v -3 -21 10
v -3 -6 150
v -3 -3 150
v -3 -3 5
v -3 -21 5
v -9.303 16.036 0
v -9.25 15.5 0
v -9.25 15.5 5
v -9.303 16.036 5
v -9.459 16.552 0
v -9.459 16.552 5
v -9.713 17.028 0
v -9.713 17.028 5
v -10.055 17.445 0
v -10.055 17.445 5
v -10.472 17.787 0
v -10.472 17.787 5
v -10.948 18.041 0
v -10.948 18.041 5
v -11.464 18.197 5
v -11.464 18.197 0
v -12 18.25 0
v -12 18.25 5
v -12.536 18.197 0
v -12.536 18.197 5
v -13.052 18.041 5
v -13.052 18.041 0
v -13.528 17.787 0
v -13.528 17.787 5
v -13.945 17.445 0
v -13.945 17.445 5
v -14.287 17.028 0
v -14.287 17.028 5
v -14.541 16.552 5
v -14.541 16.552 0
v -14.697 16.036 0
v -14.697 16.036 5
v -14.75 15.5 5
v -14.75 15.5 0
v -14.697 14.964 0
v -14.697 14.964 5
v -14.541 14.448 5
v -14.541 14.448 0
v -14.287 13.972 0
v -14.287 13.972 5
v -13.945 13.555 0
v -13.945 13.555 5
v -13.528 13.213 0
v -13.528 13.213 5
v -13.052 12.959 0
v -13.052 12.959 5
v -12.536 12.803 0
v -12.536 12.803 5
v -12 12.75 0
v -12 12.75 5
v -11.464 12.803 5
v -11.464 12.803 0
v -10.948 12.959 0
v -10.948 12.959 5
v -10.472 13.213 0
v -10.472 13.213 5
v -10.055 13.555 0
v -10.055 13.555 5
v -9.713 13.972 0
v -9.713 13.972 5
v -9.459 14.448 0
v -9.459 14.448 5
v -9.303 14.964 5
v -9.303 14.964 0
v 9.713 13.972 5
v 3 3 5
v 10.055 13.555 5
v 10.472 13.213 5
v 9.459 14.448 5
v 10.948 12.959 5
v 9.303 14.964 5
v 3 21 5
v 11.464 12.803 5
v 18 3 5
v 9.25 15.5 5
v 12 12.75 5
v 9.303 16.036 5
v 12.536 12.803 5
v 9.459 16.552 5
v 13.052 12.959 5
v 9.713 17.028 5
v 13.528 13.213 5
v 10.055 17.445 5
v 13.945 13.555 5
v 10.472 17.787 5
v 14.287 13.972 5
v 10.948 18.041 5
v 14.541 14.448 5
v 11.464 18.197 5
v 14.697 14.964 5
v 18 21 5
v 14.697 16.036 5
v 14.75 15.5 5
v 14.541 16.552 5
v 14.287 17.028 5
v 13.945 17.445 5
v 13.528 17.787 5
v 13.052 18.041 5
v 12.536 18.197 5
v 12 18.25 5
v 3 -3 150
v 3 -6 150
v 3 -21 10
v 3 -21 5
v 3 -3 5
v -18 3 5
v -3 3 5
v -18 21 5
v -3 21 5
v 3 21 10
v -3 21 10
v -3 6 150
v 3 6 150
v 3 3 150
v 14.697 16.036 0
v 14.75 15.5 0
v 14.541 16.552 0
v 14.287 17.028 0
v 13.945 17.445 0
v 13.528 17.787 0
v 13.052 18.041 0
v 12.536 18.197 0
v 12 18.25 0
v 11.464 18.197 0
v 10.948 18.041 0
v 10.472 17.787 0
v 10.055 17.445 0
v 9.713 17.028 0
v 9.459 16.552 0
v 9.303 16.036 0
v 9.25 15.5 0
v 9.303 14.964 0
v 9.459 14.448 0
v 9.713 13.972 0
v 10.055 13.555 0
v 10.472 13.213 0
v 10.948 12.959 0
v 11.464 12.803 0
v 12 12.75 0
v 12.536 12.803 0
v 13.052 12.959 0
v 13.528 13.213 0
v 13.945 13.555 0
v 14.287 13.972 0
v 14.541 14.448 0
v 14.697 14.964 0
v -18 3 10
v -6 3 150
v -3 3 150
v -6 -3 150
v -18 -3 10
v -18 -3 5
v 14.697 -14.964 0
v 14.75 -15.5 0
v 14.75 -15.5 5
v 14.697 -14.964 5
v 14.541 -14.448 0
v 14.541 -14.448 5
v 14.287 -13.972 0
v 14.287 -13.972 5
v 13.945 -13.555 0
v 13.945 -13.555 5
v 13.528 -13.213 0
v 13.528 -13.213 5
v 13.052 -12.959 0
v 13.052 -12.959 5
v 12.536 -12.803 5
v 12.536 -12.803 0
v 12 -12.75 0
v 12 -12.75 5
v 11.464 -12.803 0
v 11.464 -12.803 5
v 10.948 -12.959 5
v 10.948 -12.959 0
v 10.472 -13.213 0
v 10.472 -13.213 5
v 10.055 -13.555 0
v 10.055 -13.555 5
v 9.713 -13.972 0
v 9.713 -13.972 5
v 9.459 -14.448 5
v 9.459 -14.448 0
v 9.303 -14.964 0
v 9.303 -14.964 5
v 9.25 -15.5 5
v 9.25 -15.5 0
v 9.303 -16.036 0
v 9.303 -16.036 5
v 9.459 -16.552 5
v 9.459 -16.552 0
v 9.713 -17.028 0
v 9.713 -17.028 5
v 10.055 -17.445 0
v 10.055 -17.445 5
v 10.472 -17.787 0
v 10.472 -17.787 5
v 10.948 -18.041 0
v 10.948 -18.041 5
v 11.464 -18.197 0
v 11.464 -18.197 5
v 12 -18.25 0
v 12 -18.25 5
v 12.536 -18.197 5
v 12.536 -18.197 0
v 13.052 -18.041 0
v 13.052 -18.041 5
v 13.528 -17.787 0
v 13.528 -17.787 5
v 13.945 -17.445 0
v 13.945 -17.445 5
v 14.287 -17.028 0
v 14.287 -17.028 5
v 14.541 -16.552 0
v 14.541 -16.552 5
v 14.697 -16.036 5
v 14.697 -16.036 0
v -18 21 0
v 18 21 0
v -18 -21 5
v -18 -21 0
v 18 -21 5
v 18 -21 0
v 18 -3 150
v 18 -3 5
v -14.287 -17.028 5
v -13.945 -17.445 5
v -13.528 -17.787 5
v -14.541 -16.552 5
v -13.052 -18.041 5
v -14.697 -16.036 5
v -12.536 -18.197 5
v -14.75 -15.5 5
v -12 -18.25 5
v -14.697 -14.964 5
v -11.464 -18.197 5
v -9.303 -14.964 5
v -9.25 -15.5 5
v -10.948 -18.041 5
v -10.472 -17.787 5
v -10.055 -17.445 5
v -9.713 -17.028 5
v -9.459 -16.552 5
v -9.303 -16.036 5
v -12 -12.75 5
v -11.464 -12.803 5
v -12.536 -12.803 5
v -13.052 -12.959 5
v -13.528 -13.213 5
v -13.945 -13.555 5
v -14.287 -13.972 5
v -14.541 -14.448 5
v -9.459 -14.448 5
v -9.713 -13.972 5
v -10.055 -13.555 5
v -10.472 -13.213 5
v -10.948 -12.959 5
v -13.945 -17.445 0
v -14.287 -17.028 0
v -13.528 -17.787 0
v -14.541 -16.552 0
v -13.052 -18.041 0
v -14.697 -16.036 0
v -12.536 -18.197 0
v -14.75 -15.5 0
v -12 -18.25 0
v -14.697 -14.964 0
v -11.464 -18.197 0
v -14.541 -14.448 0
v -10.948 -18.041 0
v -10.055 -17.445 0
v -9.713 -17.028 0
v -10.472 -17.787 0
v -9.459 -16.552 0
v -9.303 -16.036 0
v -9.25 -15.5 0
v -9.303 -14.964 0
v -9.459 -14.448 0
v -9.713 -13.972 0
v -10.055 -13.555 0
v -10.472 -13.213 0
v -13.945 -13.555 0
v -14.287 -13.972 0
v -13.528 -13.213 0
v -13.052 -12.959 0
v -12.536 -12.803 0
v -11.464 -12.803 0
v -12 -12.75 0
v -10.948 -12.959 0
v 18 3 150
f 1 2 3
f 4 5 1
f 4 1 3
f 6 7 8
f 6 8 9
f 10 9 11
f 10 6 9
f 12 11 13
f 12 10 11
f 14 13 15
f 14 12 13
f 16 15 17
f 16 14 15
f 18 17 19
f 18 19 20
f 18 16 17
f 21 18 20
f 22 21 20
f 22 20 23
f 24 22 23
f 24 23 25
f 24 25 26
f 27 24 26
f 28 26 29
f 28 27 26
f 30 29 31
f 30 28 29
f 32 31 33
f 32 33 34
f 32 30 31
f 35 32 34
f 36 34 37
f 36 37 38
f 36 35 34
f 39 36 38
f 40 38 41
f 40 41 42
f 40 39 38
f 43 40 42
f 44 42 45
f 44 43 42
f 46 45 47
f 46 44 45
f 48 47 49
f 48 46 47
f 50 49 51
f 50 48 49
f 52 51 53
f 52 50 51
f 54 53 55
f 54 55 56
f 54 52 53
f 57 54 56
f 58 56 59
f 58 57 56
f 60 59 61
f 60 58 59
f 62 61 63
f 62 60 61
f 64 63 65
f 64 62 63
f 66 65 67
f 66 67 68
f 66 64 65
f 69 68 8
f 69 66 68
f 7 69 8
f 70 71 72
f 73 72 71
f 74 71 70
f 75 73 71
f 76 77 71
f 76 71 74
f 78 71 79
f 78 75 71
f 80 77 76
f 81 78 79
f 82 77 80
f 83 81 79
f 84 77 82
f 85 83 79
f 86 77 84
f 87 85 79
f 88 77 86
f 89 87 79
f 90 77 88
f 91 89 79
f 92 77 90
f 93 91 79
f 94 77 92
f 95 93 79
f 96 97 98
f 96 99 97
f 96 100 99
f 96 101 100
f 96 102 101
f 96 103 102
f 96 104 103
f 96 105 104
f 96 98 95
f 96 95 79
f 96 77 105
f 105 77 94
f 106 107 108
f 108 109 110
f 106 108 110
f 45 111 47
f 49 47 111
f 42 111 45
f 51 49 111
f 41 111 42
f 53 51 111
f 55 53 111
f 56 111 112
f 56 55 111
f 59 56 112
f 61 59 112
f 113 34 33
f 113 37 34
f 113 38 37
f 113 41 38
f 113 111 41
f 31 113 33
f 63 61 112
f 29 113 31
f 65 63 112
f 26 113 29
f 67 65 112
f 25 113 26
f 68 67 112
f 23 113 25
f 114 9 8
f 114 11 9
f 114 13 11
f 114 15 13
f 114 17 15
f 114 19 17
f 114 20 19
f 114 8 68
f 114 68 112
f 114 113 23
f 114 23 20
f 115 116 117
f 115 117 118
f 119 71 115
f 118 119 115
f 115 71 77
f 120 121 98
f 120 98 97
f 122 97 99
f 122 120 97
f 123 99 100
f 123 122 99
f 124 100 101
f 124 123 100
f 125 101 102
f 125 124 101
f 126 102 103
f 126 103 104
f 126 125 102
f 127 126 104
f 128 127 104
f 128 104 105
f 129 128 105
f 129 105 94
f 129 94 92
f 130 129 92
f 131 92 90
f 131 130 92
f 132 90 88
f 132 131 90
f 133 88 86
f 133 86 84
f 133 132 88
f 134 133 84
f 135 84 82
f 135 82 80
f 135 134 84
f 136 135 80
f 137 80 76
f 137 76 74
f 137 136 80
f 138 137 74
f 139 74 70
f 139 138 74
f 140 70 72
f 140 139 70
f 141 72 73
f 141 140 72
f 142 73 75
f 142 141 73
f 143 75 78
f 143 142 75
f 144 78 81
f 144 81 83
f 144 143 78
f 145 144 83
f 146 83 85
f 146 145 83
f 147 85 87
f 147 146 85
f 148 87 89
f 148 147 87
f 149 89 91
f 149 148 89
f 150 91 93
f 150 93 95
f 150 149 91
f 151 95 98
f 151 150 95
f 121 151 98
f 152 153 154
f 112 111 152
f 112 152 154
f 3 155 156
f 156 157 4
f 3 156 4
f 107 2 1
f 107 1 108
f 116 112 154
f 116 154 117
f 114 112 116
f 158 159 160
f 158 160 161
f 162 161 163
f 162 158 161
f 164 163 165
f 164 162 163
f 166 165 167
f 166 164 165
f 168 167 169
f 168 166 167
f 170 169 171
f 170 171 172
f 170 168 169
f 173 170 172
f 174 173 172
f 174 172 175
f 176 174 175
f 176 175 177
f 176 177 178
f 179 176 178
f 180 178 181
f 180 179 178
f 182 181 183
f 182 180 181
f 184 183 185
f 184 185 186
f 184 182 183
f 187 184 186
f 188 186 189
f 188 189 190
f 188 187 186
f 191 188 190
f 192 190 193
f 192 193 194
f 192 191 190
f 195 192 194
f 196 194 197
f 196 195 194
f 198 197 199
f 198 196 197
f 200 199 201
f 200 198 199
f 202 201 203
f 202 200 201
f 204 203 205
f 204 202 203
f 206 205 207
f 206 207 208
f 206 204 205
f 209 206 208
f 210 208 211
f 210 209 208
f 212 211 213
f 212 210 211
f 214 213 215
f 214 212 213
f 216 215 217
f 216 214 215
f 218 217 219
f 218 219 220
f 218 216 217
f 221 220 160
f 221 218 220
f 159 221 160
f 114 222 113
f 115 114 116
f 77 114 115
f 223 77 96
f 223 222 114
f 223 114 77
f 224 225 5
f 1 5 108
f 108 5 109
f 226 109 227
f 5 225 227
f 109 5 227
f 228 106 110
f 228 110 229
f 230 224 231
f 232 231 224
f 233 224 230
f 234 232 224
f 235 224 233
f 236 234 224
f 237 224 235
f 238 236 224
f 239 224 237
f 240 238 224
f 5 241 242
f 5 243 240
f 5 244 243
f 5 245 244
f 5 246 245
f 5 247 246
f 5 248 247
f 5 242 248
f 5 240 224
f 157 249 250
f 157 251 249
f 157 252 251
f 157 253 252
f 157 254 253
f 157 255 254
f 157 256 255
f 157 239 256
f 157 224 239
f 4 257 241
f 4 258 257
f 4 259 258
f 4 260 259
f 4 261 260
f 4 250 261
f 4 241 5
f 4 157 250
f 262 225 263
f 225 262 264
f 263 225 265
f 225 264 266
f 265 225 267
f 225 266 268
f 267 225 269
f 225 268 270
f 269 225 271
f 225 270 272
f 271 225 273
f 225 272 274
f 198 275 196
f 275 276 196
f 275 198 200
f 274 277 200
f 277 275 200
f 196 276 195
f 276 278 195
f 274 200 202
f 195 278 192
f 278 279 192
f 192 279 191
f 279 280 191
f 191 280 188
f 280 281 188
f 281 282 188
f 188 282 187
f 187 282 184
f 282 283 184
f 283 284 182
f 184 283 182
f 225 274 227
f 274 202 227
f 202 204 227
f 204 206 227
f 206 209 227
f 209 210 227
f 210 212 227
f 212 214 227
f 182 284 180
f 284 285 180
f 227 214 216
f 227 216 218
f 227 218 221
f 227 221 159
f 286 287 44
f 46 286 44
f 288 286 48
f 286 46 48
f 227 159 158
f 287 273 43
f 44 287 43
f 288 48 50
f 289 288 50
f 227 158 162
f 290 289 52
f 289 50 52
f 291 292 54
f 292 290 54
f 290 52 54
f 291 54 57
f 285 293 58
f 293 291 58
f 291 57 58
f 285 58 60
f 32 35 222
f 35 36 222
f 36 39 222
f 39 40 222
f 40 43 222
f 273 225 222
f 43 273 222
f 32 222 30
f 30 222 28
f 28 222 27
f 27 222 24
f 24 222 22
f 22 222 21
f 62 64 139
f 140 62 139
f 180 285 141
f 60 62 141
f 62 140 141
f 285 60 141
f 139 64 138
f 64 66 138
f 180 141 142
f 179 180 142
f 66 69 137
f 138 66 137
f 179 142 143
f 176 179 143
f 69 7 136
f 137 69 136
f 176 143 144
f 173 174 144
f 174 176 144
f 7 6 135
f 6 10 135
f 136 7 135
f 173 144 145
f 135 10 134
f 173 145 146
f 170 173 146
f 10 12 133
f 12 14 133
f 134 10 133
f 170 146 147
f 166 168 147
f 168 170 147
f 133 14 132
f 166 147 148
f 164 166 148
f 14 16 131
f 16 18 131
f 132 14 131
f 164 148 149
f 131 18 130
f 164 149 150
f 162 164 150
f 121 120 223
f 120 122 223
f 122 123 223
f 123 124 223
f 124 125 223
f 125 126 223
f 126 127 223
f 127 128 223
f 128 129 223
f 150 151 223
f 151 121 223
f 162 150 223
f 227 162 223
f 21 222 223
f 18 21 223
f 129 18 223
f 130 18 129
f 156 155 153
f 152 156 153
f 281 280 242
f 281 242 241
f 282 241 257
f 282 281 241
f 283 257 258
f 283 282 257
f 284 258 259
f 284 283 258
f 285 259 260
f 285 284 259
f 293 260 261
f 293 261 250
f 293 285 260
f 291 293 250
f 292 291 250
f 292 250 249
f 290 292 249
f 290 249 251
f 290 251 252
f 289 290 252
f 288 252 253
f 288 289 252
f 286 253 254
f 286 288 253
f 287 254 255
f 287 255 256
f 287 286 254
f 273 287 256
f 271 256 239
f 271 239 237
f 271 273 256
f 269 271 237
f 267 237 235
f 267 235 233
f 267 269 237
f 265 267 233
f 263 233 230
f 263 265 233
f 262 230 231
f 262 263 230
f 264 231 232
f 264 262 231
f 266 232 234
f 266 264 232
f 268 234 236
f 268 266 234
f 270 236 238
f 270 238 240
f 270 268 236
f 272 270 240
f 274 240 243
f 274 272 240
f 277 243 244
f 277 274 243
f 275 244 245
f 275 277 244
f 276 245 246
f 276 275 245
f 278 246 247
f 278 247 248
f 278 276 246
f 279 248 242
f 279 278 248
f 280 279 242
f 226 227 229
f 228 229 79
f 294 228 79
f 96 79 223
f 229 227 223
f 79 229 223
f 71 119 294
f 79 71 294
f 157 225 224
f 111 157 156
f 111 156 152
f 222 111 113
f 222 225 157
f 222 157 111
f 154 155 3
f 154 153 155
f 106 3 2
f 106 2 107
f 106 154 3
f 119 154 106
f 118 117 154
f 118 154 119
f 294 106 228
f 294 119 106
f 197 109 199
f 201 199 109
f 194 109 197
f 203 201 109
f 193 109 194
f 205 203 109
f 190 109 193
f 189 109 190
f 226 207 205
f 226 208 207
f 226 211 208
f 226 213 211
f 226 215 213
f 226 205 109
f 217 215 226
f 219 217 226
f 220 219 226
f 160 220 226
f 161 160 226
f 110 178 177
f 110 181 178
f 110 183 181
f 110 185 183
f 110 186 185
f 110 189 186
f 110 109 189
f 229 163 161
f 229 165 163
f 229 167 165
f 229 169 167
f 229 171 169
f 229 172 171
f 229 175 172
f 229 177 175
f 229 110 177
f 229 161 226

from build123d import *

# Parameters (mm, degrees)
F0_W     = 15
F0_H     = 18
F0_R     = 2.75
F1_DEPTH = 5
F0_W_2   = 6
F0_H_2   = 6
F2_DEPTH = 150
F3_SIZE2 = 140
F3_SIZE  = 15
F4_SIZE2 = 15
F4_SIZE  = 140
F5_SIZE2 = 12
F5_SIZE  = 140


with BuildPart() as f1:
    # F0 (on Top) → F1 (new body)
    with BuildSketch(Plane.XY):
        with Locations((10.5, 12)):
            Rectangle(F0_W, F0_H)
        with Locations((12, 15.5)):
            Circle(F0_R, mode=Mode.SUBTRACT)
    extrude(amount=F1_DEPTH)



with BuildPart() as f1b:
    # F0 (on Top) → F1, piece 2 (new body)
    with BuildSketch(Plane.XY):
        with Locations((-10.5, 12)):
            Rectangle(F0_W, F0_H)
        with Locations((-12, 15.5)):
            Circle(F0_R, mode=Mode.SUBTRACT)
    extrude(amount=F1_DEPTH)


with BuildPart() as f1c:
    # F0 (on Top) → F1, piece 3 (new body)
    with BuildSketch(Plane.XY):
        with Locations((-10.5, -12)):
            Rectangle(F0_W, F0_H)
        with Locations((-12, -15.5)):
            Circle(F0_R, mode=Mode.SUBTRACT)
    extrude(amount=F1_DEPTH)


with BuildPart() as f1d:
    # F0 (on Top) → F1, piece 4 (new body)
    with BuildSketch(Plane.XY):
        with Locations((10.5, -12)):
            Rectangle(F0_W, F0_H)
        with Locations((12, -15.5)):
            Circle(F0_R, mode=Mode.SUBTRACT)
    extrude(amount=F1_DEPTH)


with BuildPart() as f1_1:
    add(f1.part)

    add(f1b.part)  # F2 merges F1b

    add(f1c.part)  # F2 merges F1c

    add(f1d.part)  # F2 merges F1d
    # F0 (on Top) → F2 (join)
    with BuildSketch(Plane.XY):
        with Locations((0, 12)):
            Rectangle(F0_W_2, F0_H)
        with Locations((0, -12)):
            Rectangle(F0_W_2, F0_H)
        with Locations((10.5, 0)):
            Rectangle(F0_W, F0_H_2)
        with Locations((-10.5, 0)):
            Rectangle(F0_W, F0_H_2)
        Rectangle(F0_W_2, F0_H_2)
    extrude(amount=F2_DEPTH)

    # F3
    f3_edges = [f1_1.edges().sort_by_distance(p)[0] for p in [
        (0, 21, 150),
    ]]
    f3_side = f1_1.faces().sort_by_distance((0, 0, 150))[0]
    chamfer(f3_edges, length=F3_SIZE, length2=F3_SIZE2, reference=f3_side)

    # F4
    f4_edges = [f1_1.edges().sort_by_distance(p)[0] for p in [
        (0, -21, 150),
    ]]
    f4_side = f1_1.faces().sort_by_distance((0, -21, 64.642857))[0]
    chamfer(f4_edges, length=F4_SIZE, length2=F4_SIZE2, reference=f4_side)

    # F5
    f5_edges = [f1_1.edges().sort_by_distance(p)[0] for p in [
        (-18, 0, 150),
    ]]
    f5_side = f1_1.faces().sort_by_distance((-18, 0, 62.916667))[0]
    chamfer(f5_edges, length=F5_SIZE, length2=F5_SIZE2, reference=f5_side)


solid = f1_1.part
